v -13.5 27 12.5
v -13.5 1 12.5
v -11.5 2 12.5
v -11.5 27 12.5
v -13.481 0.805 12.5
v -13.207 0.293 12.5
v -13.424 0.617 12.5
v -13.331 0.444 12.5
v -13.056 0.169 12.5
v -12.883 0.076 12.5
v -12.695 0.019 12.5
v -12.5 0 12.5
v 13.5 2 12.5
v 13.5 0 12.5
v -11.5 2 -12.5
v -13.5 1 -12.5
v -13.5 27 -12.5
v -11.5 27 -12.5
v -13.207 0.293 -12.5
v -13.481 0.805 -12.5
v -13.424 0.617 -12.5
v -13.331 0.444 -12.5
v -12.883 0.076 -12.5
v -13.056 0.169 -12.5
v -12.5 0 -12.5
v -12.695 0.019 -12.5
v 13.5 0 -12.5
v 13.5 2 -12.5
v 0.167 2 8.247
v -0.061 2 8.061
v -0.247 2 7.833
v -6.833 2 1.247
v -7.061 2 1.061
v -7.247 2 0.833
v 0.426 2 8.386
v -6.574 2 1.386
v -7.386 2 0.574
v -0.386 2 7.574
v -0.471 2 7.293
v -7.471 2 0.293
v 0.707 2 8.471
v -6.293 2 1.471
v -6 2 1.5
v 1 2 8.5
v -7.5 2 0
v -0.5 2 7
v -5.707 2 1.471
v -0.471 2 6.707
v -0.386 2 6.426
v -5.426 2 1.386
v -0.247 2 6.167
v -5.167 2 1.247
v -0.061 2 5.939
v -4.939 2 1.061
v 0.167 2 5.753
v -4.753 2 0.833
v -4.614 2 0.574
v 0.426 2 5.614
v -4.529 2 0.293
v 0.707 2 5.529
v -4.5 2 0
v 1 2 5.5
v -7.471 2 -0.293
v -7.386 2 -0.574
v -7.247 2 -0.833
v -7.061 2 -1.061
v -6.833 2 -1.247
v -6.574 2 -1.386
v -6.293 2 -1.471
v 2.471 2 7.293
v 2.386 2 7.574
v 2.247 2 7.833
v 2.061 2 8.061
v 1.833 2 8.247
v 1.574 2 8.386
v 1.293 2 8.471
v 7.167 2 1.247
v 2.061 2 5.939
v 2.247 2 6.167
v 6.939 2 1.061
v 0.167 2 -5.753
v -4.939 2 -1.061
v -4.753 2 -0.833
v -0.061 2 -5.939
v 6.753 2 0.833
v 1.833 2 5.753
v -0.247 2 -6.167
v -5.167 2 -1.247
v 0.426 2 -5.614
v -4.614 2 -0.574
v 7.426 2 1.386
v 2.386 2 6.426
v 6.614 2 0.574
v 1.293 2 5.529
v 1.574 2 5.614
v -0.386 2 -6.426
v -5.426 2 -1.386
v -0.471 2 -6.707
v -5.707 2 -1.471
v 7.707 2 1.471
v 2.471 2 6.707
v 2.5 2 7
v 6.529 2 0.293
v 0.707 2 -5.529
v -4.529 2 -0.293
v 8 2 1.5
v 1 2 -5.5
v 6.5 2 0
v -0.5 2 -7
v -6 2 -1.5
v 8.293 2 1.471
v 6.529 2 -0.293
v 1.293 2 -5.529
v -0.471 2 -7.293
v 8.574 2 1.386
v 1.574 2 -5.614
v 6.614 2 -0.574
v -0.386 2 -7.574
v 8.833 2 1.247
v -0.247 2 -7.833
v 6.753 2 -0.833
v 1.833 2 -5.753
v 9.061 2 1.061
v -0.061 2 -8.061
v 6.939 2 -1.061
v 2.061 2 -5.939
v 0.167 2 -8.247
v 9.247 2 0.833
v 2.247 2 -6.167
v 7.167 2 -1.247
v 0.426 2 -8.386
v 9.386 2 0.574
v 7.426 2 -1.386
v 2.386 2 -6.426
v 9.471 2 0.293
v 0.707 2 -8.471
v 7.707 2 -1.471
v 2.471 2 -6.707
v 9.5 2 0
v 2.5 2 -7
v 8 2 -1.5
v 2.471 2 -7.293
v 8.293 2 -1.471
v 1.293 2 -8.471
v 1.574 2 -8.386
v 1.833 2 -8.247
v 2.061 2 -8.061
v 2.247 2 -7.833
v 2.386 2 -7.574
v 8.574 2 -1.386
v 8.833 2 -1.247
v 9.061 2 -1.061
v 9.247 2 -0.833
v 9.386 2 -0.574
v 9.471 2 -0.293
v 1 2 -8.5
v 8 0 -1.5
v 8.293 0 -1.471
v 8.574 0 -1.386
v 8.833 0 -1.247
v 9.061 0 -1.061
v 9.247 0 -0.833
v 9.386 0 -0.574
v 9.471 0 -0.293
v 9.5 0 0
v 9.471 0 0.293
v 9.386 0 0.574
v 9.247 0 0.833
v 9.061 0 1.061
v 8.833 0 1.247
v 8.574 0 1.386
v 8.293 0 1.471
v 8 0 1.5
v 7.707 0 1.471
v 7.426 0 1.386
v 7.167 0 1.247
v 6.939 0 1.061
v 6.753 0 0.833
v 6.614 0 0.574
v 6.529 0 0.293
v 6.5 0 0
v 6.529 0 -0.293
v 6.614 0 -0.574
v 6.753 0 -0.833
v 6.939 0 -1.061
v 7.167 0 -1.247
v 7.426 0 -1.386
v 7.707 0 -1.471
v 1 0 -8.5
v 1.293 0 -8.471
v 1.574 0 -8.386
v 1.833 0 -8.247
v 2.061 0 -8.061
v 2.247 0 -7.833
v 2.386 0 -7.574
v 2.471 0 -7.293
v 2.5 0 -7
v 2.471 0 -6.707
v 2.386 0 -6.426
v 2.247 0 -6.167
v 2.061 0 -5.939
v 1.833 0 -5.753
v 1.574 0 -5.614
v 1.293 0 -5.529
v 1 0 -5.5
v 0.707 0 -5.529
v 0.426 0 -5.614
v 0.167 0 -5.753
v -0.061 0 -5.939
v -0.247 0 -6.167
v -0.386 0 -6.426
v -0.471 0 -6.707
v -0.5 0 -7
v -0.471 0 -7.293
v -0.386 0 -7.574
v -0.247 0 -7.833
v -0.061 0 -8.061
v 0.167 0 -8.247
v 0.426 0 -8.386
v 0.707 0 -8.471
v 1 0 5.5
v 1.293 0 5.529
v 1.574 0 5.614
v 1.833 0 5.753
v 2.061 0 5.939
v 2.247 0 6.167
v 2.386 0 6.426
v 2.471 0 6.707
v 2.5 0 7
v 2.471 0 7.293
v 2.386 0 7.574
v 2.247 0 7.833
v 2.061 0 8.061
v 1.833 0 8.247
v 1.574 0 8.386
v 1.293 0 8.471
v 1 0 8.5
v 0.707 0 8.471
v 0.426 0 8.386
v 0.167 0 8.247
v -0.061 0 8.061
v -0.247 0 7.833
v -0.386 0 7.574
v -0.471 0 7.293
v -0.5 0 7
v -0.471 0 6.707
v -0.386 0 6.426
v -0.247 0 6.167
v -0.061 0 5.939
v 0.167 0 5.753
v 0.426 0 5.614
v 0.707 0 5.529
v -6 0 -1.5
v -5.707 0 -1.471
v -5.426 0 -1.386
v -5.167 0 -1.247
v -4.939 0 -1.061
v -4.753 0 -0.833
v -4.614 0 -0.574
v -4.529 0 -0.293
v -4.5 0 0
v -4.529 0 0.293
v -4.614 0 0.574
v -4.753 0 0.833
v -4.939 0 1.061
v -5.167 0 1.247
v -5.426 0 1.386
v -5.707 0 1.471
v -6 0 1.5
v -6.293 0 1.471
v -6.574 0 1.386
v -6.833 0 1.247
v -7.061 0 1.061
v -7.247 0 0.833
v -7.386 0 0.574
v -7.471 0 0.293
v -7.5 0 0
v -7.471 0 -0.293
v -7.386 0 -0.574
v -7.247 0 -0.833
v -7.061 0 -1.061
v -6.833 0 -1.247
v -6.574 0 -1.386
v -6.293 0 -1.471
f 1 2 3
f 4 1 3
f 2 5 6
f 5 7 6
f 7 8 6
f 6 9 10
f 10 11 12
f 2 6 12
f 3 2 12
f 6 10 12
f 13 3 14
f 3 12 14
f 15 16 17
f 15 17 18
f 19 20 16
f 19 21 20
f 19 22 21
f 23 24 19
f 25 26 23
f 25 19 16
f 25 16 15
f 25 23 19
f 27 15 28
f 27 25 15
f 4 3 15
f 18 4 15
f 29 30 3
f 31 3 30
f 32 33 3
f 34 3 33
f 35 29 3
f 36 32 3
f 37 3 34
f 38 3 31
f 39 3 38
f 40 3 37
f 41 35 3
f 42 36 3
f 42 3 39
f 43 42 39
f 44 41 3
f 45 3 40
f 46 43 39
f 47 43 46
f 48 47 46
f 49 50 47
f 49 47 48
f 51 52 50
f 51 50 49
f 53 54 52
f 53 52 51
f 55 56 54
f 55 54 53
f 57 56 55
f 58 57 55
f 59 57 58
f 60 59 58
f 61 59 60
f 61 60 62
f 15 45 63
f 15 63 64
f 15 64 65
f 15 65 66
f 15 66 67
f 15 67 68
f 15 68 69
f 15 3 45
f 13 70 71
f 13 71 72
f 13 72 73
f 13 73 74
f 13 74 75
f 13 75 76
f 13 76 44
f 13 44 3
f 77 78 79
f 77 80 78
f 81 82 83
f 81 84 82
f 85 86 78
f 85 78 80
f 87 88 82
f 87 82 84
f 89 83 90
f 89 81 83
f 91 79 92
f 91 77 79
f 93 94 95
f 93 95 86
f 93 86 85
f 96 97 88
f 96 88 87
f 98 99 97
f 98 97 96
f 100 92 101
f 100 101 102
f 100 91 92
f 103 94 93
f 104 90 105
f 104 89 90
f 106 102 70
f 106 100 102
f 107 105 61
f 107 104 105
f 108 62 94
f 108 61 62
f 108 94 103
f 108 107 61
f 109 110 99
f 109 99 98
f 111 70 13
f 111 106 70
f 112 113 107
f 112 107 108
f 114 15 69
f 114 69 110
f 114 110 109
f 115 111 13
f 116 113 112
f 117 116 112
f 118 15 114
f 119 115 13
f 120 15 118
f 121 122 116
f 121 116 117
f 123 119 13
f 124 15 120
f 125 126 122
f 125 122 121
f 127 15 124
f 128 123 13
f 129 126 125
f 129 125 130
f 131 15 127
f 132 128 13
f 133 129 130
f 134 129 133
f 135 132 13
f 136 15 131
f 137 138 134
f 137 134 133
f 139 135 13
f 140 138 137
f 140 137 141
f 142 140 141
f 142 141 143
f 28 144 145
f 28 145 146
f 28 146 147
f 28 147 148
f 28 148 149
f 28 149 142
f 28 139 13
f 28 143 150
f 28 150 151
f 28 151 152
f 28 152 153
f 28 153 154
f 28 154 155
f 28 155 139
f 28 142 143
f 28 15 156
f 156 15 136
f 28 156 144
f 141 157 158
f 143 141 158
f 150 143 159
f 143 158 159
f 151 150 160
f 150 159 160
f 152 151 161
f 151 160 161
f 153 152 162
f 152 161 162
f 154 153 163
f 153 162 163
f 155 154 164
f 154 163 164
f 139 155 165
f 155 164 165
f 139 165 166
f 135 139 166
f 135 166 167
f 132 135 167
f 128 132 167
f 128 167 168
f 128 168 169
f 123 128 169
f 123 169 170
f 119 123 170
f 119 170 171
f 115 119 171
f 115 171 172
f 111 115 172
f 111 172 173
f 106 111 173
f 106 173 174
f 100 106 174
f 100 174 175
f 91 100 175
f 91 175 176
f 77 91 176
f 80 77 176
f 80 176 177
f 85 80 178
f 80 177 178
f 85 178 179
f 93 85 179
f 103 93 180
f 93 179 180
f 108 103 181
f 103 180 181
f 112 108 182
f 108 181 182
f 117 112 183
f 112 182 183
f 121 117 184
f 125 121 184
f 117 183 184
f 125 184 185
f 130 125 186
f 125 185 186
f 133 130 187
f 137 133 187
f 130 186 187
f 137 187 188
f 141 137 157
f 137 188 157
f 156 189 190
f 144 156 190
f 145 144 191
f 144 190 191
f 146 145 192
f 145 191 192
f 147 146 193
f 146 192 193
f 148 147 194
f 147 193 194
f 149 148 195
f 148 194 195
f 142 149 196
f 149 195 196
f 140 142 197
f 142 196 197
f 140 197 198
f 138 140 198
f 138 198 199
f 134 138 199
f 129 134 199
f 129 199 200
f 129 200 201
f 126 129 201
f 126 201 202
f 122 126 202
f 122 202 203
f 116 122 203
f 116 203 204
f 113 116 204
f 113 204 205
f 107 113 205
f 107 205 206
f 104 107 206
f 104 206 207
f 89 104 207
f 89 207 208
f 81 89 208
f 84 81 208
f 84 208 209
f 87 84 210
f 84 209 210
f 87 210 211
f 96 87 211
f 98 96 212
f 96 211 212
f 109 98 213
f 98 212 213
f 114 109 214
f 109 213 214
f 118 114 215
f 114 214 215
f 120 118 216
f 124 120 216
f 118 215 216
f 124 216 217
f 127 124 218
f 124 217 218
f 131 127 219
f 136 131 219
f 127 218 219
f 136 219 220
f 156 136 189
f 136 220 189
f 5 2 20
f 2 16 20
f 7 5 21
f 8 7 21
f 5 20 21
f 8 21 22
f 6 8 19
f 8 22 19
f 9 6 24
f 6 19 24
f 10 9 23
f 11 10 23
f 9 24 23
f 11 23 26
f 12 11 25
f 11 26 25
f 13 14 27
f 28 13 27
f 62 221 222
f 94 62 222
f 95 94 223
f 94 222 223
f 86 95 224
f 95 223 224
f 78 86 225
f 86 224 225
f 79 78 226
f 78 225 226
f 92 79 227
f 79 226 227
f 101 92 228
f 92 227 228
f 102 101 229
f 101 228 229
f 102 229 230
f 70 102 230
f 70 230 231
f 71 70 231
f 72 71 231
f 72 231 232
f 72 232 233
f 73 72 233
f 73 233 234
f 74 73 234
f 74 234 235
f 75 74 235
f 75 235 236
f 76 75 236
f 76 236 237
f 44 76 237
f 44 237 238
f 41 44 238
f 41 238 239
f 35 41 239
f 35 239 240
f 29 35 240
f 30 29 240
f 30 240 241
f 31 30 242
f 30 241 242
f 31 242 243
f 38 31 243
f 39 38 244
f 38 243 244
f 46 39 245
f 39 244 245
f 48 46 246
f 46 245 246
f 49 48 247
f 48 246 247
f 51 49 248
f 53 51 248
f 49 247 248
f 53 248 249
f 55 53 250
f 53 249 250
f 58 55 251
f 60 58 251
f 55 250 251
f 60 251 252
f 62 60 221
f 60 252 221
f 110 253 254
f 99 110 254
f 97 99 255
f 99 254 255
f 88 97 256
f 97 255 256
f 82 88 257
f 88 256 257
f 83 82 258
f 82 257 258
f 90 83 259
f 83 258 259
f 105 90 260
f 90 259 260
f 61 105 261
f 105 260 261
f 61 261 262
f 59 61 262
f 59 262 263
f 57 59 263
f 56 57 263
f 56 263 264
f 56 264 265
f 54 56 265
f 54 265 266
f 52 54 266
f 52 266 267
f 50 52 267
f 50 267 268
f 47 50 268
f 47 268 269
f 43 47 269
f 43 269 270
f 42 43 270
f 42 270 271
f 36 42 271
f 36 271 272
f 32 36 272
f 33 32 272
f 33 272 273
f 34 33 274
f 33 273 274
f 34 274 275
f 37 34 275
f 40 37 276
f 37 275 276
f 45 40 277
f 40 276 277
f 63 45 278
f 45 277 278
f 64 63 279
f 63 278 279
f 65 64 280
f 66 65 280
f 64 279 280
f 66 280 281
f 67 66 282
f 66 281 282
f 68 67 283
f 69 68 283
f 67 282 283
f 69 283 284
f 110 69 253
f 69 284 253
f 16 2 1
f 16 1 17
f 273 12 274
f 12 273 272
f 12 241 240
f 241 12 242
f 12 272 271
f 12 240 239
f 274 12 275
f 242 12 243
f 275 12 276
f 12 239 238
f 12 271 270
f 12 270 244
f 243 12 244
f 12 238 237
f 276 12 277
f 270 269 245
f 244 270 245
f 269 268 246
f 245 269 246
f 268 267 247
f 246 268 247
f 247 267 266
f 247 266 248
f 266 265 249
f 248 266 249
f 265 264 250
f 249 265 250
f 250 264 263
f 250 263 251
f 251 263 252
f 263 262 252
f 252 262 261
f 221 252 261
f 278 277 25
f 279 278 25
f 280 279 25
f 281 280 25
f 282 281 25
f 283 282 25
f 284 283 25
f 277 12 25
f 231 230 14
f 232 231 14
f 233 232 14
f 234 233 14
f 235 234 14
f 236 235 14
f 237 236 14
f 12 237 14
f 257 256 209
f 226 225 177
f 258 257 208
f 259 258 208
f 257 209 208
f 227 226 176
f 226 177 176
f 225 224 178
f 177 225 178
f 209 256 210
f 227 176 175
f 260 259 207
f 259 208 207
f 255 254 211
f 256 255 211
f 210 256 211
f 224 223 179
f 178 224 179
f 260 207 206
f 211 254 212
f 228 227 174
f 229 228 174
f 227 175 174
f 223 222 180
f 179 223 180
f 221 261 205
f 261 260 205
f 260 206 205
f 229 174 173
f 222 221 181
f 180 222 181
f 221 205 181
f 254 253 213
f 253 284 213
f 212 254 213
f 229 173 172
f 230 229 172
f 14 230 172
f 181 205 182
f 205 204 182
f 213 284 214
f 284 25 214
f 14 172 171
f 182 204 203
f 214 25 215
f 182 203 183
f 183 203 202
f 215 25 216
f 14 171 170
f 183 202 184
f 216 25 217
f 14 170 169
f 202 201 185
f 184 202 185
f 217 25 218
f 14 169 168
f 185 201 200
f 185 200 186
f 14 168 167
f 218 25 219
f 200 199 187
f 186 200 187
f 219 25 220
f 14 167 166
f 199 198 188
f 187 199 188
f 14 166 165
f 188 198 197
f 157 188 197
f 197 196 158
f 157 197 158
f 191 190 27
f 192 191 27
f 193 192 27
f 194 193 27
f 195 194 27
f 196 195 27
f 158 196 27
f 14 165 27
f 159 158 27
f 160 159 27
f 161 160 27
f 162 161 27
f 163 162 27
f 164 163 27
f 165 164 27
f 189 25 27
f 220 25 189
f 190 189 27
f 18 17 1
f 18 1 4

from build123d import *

# Parameters (mm, degrees)
SKETCH_1_W          = 27
SKETCH_1_H          = 25
EXTRUDE_1_DEPTH     = 2
SKETCH_2_W          = 2
SKETCH_2_H          = 25
EXTRUDE_2_DEPTH     = 25
SKETCH_3_R          = 1.5
CUT_EXTRUDE_1_DEPTH = 33.672618505
FILLET_1_R          = 1


with BuildPart() as part:
    # 草图1 → 凸台-拉伸1 (new body)
    with BuildSketch(Plane(origin=(0, 0, 0), x_dir=(1, 0, 0), z_dir=(0, 1, 0))):
        Rectangle(SKETCH_1_W, SKETCH_1_H)
    extrude(amount=EXTRUDE_1_DEPTH)

    # 草图2 → 凸台-拉伸2 (add)
    with BuildSketch(Plane(origin=(0, 2, 0), x_dir=(1, 0, 0), z_dir=(0, 1, 0))):
        with Locations((-12.5, 0)):
            Rectangle(SKETCH_2_W, SKETCH_2_H)
    extrude(amount=EXTRUDE_2_DEPTH)

    # 草图3 → 切除-拉伸1 (cut, through all)
    with BuildSketch(Plane.XZ):
        with Locations(Location((1, 7, 0), (0, 0, 270))):
            Circle(SKETCH_3_R)
        with Locations(Location((8, 0, 0), (0, 0, 270))):
            Circle(SKETCH_3_R)
        with Locations(Location((1, -7, 0), (0, 0, 270))):
            Circle(SKETCH_3_R)
        with Locations(Location((-6, 0, 0), (0, 0, 270))):
            Circle(SKETCH_3_R)
    extrude(amount=-CUT_EXTRUDE_1_DEPTH, mode=Mode.SUBTRACT)

    # 圆角1
    fillet_1_edges = [part.edges().sort_by_distance(p)[0] for p in [
        (-13.5, 0, 0),
    ]]
    fillet(fillet_1_edges, radius=FILLET_1_R)


solid = part.part
